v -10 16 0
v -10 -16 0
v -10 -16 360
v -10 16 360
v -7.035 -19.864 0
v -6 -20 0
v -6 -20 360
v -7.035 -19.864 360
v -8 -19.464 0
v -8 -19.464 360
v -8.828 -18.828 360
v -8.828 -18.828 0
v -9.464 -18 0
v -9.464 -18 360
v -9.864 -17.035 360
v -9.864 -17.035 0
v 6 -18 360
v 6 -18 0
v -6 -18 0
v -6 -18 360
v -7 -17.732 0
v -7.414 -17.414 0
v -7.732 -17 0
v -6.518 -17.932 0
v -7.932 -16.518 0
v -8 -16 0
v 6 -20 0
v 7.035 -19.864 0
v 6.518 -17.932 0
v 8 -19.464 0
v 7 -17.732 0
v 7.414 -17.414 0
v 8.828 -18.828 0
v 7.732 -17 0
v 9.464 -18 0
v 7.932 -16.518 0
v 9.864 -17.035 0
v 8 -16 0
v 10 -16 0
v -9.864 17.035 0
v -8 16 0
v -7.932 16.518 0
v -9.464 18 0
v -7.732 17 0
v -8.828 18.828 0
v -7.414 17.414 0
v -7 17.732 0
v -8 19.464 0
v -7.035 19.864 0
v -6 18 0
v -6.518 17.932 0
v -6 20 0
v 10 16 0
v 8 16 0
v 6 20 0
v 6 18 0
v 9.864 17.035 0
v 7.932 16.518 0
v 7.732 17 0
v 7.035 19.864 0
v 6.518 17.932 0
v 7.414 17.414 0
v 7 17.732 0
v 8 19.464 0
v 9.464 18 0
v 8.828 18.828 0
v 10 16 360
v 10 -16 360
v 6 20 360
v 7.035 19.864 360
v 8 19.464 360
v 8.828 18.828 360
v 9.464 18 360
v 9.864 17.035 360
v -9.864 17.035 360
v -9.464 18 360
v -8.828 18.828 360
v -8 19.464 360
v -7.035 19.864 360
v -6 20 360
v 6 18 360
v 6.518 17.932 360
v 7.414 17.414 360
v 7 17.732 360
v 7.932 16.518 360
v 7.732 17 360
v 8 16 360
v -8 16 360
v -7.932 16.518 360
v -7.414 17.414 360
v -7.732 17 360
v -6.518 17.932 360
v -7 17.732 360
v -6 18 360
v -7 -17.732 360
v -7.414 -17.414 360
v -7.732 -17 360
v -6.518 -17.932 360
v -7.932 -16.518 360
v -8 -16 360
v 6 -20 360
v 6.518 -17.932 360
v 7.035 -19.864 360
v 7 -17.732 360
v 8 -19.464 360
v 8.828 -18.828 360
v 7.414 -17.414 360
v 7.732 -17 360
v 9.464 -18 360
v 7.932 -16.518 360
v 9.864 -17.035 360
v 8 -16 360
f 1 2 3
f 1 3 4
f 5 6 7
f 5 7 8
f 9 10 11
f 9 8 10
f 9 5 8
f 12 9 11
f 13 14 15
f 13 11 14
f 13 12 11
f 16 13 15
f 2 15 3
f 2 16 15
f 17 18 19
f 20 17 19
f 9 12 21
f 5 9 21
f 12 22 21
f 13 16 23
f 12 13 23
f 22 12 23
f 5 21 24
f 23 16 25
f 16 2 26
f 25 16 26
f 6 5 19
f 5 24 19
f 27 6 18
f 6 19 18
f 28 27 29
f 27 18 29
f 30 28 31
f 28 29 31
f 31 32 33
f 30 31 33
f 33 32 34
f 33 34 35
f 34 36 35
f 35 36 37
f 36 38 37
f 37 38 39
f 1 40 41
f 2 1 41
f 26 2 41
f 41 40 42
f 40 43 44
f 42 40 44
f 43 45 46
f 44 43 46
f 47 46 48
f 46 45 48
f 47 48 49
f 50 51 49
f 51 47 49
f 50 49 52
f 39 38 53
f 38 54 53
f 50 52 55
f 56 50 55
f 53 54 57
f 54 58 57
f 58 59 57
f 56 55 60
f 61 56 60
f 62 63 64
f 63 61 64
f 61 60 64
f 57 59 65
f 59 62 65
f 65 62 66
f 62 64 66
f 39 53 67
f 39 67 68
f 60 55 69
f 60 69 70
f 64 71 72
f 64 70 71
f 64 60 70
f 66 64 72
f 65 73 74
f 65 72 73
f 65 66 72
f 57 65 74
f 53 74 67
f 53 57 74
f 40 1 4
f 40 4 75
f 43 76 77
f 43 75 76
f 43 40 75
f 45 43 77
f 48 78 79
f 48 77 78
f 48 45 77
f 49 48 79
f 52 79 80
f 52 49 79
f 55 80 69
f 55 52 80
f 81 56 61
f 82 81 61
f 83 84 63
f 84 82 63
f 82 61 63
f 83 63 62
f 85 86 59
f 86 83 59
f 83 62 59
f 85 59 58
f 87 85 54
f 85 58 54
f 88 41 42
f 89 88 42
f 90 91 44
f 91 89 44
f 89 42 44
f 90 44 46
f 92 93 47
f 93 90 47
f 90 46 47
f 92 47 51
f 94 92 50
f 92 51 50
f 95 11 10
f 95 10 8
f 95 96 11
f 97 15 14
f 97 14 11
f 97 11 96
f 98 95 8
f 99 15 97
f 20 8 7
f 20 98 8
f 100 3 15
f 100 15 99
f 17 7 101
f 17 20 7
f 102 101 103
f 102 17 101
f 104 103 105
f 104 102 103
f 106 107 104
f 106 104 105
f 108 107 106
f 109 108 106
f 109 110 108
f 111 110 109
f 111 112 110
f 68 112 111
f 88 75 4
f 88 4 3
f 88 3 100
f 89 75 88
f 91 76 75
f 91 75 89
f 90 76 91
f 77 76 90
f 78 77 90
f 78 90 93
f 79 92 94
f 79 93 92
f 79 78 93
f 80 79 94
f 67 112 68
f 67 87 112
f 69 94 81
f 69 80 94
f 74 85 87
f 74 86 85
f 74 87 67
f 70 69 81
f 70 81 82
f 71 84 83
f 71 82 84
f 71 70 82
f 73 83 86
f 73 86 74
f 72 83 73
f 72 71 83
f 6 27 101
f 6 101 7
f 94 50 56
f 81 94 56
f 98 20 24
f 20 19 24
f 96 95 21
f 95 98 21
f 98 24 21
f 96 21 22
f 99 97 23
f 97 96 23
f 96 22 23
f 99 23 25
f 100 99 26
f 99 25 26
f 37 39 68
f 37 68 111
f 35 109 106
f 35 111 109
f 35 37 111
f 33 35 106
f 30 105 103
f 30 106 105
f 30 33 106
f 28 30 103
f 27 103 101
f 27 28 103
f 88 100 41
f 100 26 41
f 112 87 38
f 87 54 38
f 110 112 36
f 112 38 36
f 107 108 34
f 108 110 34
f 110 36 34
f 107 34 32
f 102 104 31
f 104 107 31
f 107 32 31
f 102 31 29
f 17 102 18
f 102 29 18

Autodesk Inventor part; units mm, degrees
ref_plane "YZ Plane" through (0, 0, 0) normal (1, 0, 0) x (0, 1, 0)
ref_plane "Start Plane" through (0, 0, 0) normal (0, 0, 1) x (1, 0, 0)
ref_plane "End Plane" through (0, 0, 360) normal (0, 0, 1) x (1, 0, 0)
sketch "Sketch" plane through (0, 0, 0) normal (0, 0, 1) x (1, 0, 0)
  line L0 (-10, -16) -> (-10, 16)
  line L1 (-6, 20) -> (6, 20)
  line L2 (10, 16) -> (10, -16)
  line L3 (6, -20) -> (-6, -20)
  arc A0 (-10, -16) -> (-6, -20) centre (-6, -16) ccw
  arc A1 (10, 16) -> (6, 20) centre (6, 16) ccw
  arc A2 (-6, 20) -> (-10, 16) centre (-6, 16) ccw
  arc A3 (6, -20) -> (10, -16) centre (6, -16) ccw
  arc A4 (-6, 18) -> (-8, 16) centre (-6, 16) ccw
  line L4 (-6, 18) -> (6, 18)
  arc A5 (8, 16) -> (6, 18) centre (6, 16) ccw
  line L5 (8, 16) -> (8, -16)
  arc A6 (6, -18) -> (8, -16) centre (6, -16) ccw
  line L6 (6, -18) -> (-6, -18)
  arc A7 (-8, -16) -> (-6, -18) centre (-6, -16) ccw
  line L7 (-8, -16) -> (-8, 16)
  line L8 (0, 29.1598) -> (0, -29.1598) construction
  line L9 (-15.1598, 0) -> (15.1598, 0) construction
  dimension "d7" = 4
  dimension "d9" = 20
  dimension "d11" = 40
  dimension "d12" = 2
  dimension "d15" = 10
  dimension "d16" = 20
extrude "Body" add sketch "Sketch" along normal up to surface (360 mm away) from surface at 0
sketch "Sketch3" plane through (0, 0, 0) normal (0, 0, 1) x (1, 0, 0)
  line L0 (0, 0) -> (10, 0)
ref_plane "Work Plane3" through (0, 0, 0) normal (0, -1, 0) x (1, 0, 0)
sketch "Sketch4" plane through (0, 0, 0) normal (0, -1, 0) x (1, 0, 0)
  line L0 (-2, 0) -> (12, 0) projected
  line L1 (-2, 360) -> (12, 360) projected
  dimension "d18" = 360
equation "\"d7\" = G_IR"
equation "\"d9\" = G_W"
equation "\"d11\" = G_H"
equation "\"d12\" = G_T"
equation "\"d15\" = 0.5 * d9"
equation "\"d16\" = 0.5 * d11"
equation "\"d3\" = G_L"
equation "\"G_W\" = 20"
equation "\"G_H\" = 40"
equation "\"G_T\" = 2"
equation "\"G_IR\" = 4"
equation "\"G_L\" = d18"
equation "\"G_OFFSET_START\" = 0"
properties part number "ISO 4019 - 40x20x2 - 360" material "Steel, Mild"
